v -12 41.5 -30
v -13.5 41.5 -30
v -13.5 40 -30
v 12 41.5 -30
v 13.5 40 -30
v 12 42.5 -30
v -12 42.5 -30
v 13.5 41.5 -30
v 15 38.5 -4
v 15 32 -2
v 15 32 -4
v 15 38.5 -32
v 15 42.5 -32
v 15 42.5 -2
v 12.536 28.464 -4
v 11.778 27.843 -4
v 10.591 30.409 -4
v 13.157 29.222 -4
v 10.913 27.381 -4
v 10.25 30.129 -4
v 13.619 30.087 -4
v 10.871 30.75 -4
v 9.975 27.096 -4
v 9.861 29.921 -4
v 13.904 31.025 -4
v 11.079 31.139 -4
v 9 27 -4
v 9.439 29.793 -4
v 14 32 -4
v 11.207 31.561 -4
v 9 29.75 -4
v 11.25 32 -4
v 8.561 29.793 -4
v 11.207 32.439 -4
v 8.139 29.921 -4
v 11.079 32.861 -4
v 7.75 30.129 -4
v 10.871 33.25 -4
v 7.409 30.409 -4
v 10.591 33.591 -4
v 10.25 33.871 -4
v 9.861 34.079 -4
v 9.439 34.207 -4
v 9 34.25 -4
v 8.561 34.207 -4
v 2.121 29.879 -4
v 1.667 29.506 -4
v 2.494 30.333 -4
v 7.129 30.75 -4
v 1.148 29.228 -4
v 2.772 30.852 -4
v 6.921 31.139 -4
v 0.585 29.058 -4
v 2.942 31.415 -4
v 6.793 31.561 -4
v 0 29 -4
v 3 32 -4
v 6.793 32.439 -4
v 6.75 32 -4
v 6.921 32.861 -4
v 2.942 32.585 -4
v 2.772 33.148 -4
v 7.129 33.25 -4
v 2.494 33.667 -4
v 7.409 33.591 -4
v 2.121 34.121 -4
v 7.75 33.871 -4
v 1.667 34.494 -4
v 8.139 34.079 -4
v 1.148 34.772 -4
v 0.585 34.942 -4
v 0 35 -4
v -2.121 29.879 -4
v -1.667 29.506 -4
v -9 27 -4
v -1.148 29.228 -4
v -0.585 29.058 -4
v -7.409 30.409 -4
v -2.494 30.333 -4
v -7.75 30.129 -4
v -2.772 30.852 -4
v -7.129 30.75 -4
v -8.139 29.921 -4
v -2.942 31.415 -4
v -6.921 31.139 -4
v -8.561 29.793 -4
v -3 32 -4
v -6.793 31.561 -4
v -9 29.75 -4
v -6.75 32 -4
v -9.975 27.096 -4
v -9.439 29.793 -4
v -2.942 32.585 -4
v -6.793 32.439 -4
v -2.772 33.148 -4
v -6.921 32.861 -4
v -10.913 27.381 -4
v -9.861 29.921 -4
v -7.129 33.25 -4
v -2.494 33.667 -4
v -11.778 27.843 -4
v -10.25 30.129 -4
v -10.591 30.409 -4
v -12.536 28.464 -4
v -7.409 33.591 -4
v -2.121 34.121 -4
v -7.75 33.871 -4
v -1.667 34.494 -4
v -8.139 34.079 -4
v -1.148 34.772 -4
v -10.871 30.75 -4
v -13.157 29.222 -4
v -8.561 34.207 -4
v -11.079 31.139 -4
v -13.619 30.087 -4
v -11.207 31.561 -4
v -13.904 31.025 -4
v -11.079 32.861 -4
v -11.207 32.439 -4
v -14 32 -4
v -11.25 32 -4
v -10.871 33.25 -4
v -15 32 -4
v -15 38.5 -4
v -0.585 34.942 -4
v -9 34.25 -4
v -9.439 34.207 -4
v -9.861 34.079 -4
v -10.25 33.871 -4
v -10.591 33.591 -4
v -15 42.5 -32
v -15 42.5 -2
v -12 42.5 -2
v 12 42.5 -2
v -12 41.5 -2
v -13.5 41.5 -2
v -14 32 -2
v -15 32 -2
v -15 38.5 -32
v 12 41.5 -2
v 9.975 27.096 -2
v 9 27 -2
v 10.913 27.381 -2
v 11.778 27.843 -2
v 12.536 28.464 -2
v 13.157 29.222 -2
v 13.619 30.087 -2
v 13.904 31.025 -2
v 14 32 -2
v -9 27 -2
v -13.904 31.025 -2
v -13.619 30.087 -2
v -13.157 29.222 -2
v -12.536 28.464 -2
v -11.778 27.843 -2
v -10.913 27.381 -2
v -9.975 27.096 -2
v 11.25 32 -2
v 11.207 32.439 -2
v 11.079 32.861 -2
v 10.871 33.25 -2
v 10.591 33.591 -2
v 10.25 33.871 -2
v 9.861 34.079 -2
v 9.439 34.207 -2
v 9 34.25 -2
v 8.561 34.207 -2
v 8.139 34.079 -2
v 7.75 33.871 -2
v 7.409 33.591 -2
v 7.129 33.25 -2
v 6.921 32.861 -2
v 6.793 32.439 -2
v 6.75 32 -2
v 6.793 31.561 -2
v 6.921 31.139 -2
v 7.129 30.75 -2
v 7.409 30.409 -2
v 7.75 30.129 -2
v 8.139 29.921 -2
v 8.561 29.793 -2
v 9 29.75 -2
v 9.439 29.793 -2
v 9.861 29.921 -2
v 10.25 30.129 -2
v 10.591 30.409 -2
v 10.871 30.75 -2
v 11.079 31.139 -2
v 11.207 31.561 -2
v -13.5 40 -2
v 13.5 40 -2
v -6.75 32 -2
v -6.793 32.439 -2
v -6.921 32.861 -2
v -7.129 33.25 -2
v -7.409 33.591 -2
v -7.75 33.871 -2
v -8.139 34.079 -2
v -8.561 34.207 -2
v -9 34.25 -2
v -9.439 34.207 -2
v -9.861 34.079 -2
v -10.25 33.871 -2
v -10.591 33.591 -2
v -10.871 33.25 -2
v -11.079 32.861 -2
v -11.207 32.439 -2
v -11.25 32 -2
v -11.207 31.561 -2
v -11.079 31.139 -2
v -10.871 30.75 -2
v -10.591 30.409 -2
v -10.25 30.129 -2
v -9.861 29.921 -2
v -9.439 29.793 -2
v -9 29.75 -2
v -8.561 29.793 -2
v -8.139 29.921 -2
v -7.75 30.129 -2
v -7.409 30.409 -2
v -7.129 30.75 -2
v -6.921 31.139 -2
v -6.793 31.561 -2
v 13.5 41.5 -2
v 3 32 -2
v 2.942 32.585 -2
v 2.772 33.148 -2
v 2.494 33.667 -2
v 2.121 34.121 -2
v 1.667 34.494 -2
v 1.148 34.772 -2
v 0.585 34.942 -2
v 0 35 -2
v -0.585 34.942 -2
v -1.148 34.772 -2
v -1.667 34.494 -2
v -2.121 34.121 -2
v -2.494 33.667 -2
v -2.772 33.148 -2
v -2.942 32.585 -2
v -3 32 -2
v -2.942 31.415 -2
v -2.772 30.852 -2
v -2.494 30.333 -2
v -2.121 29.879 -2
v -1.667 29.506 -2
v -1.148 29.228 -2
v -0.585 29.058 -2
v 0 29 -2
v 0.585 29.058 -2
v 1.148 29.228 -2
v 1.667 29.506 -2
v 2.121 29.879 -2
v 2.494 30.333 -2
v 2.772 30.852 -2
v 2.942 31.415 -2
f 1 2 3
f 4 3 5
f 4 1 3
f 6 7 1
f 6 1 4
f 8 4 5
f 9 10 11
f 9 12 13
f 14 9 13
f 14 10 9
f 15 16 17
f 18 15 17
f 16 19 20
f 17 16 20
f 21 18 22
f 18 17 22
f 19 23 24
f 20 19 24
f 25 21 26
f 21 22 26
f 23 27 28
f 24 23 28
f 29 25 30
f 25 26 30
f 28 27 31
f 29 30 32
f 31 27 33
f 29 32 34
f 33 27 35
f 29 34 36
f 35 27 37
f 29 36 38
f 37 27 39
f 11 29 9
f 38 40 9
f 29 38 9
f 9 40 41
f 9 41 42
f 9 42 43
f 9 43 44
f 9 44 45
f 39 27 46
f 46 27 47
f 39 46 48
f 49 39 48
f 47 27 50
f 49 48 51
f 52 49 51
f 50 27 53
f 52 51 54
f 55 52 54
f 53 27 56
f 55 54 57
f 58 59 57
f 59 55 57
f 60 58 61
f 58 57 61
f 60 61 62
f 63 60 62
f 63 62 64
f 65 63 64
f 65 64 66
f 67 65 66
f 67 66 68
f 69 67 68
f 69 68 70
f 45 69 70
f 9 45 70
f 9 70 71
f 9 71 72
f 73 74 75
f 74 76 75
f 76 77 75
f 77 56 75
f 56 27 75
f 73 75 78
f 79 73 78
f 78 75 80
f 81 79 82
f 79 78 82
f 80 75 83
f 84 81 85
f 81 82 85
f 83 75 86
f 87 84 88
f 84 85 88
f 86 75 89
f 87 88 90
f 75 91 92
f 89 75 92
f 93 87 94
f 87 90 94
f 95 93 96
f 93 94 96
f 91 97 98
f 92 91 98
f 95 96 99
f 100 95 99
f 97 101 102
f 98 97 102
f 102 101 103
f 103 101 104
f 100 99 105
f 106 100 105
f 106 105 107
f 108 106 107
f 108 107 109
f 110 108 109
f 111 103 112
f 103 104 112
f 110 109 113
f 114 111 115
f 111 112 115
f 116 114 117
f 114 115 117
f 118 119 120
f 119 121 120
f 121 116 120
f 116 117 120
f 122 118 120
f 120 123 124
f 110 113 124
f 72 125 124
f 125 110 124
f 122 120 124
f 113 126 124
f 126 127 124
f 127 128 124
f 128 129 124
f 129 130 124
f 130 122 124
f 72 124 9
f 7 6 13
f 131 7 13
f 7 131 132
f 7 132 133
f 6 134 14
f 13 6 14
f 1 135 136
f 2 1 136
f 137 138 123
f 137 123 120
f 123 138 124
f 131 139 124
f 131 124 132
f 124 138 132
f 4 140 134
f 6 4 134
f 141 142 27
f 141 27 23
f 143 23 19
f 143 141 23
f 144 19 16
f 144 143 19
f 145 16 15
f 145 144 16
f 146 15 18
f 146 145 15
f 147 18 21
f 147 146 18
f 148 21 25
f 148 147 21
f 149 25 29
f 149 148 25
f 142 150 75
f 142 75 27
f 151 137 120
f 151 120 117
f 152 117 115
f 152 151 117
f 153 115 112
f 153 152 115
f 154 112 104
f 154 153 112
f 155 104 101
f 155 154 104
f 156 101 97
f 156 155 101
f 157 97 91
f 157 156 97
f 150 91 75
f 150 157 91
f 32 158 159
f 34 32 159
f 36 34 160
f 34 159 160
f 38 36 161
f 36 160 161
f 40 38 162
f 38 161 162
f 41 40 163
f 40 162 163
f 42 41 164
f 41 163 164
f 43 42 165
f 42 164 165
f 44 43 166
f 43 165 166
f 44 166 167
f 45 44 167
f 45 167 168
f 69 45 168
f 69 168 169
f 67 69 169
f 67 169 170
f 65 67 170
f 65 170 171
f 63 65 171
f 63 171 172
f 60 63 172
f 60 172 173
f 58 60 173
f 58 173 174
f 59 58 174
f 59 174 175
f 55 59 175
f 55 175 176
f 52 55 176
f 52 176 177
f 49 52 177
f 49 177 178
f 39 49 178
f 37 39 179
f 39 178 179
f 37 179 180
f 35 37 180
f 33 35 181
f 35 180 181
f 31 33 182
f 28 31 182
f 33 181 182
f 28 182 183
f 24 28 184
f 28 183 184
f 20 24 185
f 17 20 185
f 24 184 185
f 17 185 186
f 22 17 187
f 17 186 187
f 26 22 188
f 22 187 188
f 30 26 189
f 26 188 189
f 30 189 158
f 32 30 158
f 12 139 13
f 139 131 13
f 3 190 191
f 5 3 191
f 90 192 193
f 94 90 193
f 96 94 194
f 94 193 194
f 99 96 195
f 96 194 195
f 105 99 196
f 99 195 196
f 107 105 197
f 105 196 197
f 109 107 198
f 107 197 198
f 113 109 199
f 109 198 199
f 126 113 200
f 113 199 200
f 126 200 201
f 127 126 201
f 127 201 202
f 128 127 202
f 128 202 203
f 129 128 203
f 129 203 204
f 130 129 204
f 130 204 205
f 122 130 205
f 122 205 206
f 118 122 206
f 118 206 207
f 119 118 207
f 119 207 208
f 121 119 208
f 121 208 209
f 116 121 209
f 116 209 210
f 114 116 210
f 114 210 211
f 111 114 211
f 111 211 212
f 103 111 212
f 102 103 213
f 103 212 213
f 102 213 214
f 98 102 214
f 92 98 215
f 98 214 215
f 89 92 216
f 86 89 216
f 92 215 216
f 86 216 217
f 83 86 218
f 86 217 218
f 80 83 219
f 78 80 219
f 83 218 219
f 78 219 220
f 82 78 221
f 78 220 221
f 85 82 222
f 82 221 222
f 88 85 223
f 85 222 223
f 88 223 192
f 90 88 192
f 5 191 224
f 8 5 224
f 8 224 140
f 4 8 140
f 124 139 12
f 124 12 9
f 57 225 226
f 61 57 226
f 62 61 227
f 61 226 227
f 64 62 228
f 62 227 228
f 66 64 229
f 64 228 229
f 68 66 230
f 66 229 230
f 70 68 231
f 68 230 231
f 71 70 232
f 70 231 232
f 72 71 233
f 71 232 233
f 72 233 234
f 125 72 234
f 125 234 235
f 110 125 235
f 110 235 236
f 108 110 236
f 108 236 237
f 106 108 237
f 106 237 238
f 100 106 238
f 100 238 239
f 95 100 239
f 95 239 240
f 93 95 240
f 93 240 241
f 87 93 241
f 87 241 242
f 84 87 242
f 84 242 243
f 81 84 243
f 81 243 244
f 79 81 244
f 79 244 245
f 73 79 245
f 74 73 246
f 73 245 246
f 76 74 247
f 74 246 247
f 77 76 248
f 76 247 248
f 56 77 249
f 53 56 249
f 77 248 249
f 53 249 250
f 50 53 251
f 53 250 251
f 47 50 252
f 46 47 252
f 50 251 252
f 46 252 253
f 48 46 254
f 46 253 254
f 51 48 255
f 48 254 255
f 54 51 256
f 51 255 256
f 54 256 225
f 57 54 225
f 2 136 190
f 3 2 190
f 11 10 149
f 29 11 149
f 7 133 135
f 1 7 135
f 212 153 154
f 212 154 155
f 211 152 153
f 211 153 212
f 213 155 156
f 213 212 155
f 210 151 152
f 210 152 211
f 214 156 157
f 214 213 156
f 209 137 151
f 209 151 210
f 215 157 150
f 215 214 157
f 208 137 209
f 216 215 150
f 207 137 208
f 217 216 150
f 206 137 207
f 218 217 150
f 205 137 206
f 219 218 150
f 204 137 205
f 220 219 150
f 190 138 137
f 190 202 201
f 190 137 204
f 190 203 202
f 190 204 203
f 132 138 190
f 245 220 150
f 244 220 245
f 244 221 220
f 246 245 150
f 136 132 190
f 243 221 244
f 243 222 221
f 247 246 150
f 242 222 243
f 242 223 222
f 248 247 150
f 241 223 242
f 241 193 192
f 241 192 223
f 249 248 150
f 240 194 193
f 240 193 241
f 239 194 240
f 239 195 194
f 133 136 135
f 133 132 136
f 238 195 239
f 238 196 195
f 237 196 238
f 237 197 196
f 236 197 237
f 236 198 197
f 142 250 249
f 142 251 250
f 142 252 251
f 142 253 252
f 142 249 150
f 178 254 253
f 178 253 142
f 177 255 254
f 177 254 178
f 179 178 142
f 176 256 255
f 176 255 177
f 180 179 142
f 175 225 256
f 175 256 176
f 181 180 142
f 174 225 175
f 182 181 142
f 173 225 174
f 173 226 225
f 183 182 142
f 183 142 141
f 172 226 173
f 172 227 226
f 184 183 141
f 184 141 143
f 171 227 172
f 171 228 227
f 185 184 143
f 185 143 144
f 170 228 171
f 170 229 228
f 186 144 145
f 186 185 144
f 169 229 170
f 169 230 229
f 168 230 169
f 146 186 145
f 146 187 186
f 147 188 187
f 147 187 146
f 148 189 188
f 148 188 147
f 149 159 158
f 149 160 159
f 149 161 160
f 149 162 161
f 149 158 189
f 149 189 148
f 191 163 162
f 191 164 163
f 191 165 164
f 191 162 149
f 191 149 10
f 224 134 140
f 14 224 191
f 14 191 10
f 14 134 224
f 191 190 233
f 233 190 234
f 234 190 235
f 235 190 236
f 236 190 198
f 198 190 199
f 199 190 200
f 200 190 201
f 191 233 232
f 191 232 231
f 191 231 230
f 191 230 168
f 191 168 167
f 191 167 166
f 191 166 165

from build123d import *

# Parameters (mm, degrees)
SKETCH136_R          = 2.25
SKETCH136_R_2        = 3
PAD082_DEPTH         = 30
POCKET029_DEPTH      = 28
SKETCH138_W          = 11.5
SKETCH138_H          = 28
POCKET030_DEPTH      = 15.001
POCKET030_DEPTH_BACK = 15.001


with BuildPart() as part:
    # Sketch136 → Pad082 (new body)
    with BuildSketch(Plane.XY):
        with BuildLine():
            Line((-9, -5), (9, -5))
            ThreePointArc((9, -5), (12.535534, -3.535534), (14, 0))
            Line((15, 0), (14, 0))
            Line((15, 0), (15, 10.5))
            Line((-15, 10.5), (15, 10.5))
            Line((-15, 0), (-15, 10.5))
            Line((-15, 0), (-14, 0))
            ThreePointArc((-14, 0), (-12.535534, -3.535534), (-9, -5))
        make_face()
        with Locations((-9, 0)):
            Circle(SKETCH136_R, mode=Mode.SUBTRACT)
        with Locations((9, 0)):
            Circle(SKETCH136_R, mode=Mode.SUBTRACT)
        Circle(SKETCH136_R_2, mode=Mode.SUBTRACT)
    extrude(amount=-PAD082_DEPTH)

    # Sketch137 → Pocket029 (cut)
    with BuildSketch(Plane.XY):
        Polygon((-12, 10.5), (-12, 9.5), (-13.5, 9.5), (-13.5, 8), (13.5, 8), (13.5, 9.5), (12, 9.5), (12, 10.5), align=None)
    extrude(amount=-POCKET029_DEPTH, mode=Mode.SUBTRACT)

    # Sketch138 → Pocket030 (cut, two sides)
    with BuildSketch(Plane.YZ) as pocket030_sk:
        with Locations((0.75, -16)):
            Rectangle(SKETCH138_W, SKETCH138_H)
    extrude(amount=-POCKET030_DEPTH, mode=Mode.SUBTRACT)
    extrude(pocket030_sk.sketch, amount=POCKET030_DEPTH_BACK, mode=Mode.SUBTRACT)


with BuildPart() as part_1:
    # Body119 placement: moved
    add(part.part.moved(Location((0, 32, -2))))


solid = part_1.part
